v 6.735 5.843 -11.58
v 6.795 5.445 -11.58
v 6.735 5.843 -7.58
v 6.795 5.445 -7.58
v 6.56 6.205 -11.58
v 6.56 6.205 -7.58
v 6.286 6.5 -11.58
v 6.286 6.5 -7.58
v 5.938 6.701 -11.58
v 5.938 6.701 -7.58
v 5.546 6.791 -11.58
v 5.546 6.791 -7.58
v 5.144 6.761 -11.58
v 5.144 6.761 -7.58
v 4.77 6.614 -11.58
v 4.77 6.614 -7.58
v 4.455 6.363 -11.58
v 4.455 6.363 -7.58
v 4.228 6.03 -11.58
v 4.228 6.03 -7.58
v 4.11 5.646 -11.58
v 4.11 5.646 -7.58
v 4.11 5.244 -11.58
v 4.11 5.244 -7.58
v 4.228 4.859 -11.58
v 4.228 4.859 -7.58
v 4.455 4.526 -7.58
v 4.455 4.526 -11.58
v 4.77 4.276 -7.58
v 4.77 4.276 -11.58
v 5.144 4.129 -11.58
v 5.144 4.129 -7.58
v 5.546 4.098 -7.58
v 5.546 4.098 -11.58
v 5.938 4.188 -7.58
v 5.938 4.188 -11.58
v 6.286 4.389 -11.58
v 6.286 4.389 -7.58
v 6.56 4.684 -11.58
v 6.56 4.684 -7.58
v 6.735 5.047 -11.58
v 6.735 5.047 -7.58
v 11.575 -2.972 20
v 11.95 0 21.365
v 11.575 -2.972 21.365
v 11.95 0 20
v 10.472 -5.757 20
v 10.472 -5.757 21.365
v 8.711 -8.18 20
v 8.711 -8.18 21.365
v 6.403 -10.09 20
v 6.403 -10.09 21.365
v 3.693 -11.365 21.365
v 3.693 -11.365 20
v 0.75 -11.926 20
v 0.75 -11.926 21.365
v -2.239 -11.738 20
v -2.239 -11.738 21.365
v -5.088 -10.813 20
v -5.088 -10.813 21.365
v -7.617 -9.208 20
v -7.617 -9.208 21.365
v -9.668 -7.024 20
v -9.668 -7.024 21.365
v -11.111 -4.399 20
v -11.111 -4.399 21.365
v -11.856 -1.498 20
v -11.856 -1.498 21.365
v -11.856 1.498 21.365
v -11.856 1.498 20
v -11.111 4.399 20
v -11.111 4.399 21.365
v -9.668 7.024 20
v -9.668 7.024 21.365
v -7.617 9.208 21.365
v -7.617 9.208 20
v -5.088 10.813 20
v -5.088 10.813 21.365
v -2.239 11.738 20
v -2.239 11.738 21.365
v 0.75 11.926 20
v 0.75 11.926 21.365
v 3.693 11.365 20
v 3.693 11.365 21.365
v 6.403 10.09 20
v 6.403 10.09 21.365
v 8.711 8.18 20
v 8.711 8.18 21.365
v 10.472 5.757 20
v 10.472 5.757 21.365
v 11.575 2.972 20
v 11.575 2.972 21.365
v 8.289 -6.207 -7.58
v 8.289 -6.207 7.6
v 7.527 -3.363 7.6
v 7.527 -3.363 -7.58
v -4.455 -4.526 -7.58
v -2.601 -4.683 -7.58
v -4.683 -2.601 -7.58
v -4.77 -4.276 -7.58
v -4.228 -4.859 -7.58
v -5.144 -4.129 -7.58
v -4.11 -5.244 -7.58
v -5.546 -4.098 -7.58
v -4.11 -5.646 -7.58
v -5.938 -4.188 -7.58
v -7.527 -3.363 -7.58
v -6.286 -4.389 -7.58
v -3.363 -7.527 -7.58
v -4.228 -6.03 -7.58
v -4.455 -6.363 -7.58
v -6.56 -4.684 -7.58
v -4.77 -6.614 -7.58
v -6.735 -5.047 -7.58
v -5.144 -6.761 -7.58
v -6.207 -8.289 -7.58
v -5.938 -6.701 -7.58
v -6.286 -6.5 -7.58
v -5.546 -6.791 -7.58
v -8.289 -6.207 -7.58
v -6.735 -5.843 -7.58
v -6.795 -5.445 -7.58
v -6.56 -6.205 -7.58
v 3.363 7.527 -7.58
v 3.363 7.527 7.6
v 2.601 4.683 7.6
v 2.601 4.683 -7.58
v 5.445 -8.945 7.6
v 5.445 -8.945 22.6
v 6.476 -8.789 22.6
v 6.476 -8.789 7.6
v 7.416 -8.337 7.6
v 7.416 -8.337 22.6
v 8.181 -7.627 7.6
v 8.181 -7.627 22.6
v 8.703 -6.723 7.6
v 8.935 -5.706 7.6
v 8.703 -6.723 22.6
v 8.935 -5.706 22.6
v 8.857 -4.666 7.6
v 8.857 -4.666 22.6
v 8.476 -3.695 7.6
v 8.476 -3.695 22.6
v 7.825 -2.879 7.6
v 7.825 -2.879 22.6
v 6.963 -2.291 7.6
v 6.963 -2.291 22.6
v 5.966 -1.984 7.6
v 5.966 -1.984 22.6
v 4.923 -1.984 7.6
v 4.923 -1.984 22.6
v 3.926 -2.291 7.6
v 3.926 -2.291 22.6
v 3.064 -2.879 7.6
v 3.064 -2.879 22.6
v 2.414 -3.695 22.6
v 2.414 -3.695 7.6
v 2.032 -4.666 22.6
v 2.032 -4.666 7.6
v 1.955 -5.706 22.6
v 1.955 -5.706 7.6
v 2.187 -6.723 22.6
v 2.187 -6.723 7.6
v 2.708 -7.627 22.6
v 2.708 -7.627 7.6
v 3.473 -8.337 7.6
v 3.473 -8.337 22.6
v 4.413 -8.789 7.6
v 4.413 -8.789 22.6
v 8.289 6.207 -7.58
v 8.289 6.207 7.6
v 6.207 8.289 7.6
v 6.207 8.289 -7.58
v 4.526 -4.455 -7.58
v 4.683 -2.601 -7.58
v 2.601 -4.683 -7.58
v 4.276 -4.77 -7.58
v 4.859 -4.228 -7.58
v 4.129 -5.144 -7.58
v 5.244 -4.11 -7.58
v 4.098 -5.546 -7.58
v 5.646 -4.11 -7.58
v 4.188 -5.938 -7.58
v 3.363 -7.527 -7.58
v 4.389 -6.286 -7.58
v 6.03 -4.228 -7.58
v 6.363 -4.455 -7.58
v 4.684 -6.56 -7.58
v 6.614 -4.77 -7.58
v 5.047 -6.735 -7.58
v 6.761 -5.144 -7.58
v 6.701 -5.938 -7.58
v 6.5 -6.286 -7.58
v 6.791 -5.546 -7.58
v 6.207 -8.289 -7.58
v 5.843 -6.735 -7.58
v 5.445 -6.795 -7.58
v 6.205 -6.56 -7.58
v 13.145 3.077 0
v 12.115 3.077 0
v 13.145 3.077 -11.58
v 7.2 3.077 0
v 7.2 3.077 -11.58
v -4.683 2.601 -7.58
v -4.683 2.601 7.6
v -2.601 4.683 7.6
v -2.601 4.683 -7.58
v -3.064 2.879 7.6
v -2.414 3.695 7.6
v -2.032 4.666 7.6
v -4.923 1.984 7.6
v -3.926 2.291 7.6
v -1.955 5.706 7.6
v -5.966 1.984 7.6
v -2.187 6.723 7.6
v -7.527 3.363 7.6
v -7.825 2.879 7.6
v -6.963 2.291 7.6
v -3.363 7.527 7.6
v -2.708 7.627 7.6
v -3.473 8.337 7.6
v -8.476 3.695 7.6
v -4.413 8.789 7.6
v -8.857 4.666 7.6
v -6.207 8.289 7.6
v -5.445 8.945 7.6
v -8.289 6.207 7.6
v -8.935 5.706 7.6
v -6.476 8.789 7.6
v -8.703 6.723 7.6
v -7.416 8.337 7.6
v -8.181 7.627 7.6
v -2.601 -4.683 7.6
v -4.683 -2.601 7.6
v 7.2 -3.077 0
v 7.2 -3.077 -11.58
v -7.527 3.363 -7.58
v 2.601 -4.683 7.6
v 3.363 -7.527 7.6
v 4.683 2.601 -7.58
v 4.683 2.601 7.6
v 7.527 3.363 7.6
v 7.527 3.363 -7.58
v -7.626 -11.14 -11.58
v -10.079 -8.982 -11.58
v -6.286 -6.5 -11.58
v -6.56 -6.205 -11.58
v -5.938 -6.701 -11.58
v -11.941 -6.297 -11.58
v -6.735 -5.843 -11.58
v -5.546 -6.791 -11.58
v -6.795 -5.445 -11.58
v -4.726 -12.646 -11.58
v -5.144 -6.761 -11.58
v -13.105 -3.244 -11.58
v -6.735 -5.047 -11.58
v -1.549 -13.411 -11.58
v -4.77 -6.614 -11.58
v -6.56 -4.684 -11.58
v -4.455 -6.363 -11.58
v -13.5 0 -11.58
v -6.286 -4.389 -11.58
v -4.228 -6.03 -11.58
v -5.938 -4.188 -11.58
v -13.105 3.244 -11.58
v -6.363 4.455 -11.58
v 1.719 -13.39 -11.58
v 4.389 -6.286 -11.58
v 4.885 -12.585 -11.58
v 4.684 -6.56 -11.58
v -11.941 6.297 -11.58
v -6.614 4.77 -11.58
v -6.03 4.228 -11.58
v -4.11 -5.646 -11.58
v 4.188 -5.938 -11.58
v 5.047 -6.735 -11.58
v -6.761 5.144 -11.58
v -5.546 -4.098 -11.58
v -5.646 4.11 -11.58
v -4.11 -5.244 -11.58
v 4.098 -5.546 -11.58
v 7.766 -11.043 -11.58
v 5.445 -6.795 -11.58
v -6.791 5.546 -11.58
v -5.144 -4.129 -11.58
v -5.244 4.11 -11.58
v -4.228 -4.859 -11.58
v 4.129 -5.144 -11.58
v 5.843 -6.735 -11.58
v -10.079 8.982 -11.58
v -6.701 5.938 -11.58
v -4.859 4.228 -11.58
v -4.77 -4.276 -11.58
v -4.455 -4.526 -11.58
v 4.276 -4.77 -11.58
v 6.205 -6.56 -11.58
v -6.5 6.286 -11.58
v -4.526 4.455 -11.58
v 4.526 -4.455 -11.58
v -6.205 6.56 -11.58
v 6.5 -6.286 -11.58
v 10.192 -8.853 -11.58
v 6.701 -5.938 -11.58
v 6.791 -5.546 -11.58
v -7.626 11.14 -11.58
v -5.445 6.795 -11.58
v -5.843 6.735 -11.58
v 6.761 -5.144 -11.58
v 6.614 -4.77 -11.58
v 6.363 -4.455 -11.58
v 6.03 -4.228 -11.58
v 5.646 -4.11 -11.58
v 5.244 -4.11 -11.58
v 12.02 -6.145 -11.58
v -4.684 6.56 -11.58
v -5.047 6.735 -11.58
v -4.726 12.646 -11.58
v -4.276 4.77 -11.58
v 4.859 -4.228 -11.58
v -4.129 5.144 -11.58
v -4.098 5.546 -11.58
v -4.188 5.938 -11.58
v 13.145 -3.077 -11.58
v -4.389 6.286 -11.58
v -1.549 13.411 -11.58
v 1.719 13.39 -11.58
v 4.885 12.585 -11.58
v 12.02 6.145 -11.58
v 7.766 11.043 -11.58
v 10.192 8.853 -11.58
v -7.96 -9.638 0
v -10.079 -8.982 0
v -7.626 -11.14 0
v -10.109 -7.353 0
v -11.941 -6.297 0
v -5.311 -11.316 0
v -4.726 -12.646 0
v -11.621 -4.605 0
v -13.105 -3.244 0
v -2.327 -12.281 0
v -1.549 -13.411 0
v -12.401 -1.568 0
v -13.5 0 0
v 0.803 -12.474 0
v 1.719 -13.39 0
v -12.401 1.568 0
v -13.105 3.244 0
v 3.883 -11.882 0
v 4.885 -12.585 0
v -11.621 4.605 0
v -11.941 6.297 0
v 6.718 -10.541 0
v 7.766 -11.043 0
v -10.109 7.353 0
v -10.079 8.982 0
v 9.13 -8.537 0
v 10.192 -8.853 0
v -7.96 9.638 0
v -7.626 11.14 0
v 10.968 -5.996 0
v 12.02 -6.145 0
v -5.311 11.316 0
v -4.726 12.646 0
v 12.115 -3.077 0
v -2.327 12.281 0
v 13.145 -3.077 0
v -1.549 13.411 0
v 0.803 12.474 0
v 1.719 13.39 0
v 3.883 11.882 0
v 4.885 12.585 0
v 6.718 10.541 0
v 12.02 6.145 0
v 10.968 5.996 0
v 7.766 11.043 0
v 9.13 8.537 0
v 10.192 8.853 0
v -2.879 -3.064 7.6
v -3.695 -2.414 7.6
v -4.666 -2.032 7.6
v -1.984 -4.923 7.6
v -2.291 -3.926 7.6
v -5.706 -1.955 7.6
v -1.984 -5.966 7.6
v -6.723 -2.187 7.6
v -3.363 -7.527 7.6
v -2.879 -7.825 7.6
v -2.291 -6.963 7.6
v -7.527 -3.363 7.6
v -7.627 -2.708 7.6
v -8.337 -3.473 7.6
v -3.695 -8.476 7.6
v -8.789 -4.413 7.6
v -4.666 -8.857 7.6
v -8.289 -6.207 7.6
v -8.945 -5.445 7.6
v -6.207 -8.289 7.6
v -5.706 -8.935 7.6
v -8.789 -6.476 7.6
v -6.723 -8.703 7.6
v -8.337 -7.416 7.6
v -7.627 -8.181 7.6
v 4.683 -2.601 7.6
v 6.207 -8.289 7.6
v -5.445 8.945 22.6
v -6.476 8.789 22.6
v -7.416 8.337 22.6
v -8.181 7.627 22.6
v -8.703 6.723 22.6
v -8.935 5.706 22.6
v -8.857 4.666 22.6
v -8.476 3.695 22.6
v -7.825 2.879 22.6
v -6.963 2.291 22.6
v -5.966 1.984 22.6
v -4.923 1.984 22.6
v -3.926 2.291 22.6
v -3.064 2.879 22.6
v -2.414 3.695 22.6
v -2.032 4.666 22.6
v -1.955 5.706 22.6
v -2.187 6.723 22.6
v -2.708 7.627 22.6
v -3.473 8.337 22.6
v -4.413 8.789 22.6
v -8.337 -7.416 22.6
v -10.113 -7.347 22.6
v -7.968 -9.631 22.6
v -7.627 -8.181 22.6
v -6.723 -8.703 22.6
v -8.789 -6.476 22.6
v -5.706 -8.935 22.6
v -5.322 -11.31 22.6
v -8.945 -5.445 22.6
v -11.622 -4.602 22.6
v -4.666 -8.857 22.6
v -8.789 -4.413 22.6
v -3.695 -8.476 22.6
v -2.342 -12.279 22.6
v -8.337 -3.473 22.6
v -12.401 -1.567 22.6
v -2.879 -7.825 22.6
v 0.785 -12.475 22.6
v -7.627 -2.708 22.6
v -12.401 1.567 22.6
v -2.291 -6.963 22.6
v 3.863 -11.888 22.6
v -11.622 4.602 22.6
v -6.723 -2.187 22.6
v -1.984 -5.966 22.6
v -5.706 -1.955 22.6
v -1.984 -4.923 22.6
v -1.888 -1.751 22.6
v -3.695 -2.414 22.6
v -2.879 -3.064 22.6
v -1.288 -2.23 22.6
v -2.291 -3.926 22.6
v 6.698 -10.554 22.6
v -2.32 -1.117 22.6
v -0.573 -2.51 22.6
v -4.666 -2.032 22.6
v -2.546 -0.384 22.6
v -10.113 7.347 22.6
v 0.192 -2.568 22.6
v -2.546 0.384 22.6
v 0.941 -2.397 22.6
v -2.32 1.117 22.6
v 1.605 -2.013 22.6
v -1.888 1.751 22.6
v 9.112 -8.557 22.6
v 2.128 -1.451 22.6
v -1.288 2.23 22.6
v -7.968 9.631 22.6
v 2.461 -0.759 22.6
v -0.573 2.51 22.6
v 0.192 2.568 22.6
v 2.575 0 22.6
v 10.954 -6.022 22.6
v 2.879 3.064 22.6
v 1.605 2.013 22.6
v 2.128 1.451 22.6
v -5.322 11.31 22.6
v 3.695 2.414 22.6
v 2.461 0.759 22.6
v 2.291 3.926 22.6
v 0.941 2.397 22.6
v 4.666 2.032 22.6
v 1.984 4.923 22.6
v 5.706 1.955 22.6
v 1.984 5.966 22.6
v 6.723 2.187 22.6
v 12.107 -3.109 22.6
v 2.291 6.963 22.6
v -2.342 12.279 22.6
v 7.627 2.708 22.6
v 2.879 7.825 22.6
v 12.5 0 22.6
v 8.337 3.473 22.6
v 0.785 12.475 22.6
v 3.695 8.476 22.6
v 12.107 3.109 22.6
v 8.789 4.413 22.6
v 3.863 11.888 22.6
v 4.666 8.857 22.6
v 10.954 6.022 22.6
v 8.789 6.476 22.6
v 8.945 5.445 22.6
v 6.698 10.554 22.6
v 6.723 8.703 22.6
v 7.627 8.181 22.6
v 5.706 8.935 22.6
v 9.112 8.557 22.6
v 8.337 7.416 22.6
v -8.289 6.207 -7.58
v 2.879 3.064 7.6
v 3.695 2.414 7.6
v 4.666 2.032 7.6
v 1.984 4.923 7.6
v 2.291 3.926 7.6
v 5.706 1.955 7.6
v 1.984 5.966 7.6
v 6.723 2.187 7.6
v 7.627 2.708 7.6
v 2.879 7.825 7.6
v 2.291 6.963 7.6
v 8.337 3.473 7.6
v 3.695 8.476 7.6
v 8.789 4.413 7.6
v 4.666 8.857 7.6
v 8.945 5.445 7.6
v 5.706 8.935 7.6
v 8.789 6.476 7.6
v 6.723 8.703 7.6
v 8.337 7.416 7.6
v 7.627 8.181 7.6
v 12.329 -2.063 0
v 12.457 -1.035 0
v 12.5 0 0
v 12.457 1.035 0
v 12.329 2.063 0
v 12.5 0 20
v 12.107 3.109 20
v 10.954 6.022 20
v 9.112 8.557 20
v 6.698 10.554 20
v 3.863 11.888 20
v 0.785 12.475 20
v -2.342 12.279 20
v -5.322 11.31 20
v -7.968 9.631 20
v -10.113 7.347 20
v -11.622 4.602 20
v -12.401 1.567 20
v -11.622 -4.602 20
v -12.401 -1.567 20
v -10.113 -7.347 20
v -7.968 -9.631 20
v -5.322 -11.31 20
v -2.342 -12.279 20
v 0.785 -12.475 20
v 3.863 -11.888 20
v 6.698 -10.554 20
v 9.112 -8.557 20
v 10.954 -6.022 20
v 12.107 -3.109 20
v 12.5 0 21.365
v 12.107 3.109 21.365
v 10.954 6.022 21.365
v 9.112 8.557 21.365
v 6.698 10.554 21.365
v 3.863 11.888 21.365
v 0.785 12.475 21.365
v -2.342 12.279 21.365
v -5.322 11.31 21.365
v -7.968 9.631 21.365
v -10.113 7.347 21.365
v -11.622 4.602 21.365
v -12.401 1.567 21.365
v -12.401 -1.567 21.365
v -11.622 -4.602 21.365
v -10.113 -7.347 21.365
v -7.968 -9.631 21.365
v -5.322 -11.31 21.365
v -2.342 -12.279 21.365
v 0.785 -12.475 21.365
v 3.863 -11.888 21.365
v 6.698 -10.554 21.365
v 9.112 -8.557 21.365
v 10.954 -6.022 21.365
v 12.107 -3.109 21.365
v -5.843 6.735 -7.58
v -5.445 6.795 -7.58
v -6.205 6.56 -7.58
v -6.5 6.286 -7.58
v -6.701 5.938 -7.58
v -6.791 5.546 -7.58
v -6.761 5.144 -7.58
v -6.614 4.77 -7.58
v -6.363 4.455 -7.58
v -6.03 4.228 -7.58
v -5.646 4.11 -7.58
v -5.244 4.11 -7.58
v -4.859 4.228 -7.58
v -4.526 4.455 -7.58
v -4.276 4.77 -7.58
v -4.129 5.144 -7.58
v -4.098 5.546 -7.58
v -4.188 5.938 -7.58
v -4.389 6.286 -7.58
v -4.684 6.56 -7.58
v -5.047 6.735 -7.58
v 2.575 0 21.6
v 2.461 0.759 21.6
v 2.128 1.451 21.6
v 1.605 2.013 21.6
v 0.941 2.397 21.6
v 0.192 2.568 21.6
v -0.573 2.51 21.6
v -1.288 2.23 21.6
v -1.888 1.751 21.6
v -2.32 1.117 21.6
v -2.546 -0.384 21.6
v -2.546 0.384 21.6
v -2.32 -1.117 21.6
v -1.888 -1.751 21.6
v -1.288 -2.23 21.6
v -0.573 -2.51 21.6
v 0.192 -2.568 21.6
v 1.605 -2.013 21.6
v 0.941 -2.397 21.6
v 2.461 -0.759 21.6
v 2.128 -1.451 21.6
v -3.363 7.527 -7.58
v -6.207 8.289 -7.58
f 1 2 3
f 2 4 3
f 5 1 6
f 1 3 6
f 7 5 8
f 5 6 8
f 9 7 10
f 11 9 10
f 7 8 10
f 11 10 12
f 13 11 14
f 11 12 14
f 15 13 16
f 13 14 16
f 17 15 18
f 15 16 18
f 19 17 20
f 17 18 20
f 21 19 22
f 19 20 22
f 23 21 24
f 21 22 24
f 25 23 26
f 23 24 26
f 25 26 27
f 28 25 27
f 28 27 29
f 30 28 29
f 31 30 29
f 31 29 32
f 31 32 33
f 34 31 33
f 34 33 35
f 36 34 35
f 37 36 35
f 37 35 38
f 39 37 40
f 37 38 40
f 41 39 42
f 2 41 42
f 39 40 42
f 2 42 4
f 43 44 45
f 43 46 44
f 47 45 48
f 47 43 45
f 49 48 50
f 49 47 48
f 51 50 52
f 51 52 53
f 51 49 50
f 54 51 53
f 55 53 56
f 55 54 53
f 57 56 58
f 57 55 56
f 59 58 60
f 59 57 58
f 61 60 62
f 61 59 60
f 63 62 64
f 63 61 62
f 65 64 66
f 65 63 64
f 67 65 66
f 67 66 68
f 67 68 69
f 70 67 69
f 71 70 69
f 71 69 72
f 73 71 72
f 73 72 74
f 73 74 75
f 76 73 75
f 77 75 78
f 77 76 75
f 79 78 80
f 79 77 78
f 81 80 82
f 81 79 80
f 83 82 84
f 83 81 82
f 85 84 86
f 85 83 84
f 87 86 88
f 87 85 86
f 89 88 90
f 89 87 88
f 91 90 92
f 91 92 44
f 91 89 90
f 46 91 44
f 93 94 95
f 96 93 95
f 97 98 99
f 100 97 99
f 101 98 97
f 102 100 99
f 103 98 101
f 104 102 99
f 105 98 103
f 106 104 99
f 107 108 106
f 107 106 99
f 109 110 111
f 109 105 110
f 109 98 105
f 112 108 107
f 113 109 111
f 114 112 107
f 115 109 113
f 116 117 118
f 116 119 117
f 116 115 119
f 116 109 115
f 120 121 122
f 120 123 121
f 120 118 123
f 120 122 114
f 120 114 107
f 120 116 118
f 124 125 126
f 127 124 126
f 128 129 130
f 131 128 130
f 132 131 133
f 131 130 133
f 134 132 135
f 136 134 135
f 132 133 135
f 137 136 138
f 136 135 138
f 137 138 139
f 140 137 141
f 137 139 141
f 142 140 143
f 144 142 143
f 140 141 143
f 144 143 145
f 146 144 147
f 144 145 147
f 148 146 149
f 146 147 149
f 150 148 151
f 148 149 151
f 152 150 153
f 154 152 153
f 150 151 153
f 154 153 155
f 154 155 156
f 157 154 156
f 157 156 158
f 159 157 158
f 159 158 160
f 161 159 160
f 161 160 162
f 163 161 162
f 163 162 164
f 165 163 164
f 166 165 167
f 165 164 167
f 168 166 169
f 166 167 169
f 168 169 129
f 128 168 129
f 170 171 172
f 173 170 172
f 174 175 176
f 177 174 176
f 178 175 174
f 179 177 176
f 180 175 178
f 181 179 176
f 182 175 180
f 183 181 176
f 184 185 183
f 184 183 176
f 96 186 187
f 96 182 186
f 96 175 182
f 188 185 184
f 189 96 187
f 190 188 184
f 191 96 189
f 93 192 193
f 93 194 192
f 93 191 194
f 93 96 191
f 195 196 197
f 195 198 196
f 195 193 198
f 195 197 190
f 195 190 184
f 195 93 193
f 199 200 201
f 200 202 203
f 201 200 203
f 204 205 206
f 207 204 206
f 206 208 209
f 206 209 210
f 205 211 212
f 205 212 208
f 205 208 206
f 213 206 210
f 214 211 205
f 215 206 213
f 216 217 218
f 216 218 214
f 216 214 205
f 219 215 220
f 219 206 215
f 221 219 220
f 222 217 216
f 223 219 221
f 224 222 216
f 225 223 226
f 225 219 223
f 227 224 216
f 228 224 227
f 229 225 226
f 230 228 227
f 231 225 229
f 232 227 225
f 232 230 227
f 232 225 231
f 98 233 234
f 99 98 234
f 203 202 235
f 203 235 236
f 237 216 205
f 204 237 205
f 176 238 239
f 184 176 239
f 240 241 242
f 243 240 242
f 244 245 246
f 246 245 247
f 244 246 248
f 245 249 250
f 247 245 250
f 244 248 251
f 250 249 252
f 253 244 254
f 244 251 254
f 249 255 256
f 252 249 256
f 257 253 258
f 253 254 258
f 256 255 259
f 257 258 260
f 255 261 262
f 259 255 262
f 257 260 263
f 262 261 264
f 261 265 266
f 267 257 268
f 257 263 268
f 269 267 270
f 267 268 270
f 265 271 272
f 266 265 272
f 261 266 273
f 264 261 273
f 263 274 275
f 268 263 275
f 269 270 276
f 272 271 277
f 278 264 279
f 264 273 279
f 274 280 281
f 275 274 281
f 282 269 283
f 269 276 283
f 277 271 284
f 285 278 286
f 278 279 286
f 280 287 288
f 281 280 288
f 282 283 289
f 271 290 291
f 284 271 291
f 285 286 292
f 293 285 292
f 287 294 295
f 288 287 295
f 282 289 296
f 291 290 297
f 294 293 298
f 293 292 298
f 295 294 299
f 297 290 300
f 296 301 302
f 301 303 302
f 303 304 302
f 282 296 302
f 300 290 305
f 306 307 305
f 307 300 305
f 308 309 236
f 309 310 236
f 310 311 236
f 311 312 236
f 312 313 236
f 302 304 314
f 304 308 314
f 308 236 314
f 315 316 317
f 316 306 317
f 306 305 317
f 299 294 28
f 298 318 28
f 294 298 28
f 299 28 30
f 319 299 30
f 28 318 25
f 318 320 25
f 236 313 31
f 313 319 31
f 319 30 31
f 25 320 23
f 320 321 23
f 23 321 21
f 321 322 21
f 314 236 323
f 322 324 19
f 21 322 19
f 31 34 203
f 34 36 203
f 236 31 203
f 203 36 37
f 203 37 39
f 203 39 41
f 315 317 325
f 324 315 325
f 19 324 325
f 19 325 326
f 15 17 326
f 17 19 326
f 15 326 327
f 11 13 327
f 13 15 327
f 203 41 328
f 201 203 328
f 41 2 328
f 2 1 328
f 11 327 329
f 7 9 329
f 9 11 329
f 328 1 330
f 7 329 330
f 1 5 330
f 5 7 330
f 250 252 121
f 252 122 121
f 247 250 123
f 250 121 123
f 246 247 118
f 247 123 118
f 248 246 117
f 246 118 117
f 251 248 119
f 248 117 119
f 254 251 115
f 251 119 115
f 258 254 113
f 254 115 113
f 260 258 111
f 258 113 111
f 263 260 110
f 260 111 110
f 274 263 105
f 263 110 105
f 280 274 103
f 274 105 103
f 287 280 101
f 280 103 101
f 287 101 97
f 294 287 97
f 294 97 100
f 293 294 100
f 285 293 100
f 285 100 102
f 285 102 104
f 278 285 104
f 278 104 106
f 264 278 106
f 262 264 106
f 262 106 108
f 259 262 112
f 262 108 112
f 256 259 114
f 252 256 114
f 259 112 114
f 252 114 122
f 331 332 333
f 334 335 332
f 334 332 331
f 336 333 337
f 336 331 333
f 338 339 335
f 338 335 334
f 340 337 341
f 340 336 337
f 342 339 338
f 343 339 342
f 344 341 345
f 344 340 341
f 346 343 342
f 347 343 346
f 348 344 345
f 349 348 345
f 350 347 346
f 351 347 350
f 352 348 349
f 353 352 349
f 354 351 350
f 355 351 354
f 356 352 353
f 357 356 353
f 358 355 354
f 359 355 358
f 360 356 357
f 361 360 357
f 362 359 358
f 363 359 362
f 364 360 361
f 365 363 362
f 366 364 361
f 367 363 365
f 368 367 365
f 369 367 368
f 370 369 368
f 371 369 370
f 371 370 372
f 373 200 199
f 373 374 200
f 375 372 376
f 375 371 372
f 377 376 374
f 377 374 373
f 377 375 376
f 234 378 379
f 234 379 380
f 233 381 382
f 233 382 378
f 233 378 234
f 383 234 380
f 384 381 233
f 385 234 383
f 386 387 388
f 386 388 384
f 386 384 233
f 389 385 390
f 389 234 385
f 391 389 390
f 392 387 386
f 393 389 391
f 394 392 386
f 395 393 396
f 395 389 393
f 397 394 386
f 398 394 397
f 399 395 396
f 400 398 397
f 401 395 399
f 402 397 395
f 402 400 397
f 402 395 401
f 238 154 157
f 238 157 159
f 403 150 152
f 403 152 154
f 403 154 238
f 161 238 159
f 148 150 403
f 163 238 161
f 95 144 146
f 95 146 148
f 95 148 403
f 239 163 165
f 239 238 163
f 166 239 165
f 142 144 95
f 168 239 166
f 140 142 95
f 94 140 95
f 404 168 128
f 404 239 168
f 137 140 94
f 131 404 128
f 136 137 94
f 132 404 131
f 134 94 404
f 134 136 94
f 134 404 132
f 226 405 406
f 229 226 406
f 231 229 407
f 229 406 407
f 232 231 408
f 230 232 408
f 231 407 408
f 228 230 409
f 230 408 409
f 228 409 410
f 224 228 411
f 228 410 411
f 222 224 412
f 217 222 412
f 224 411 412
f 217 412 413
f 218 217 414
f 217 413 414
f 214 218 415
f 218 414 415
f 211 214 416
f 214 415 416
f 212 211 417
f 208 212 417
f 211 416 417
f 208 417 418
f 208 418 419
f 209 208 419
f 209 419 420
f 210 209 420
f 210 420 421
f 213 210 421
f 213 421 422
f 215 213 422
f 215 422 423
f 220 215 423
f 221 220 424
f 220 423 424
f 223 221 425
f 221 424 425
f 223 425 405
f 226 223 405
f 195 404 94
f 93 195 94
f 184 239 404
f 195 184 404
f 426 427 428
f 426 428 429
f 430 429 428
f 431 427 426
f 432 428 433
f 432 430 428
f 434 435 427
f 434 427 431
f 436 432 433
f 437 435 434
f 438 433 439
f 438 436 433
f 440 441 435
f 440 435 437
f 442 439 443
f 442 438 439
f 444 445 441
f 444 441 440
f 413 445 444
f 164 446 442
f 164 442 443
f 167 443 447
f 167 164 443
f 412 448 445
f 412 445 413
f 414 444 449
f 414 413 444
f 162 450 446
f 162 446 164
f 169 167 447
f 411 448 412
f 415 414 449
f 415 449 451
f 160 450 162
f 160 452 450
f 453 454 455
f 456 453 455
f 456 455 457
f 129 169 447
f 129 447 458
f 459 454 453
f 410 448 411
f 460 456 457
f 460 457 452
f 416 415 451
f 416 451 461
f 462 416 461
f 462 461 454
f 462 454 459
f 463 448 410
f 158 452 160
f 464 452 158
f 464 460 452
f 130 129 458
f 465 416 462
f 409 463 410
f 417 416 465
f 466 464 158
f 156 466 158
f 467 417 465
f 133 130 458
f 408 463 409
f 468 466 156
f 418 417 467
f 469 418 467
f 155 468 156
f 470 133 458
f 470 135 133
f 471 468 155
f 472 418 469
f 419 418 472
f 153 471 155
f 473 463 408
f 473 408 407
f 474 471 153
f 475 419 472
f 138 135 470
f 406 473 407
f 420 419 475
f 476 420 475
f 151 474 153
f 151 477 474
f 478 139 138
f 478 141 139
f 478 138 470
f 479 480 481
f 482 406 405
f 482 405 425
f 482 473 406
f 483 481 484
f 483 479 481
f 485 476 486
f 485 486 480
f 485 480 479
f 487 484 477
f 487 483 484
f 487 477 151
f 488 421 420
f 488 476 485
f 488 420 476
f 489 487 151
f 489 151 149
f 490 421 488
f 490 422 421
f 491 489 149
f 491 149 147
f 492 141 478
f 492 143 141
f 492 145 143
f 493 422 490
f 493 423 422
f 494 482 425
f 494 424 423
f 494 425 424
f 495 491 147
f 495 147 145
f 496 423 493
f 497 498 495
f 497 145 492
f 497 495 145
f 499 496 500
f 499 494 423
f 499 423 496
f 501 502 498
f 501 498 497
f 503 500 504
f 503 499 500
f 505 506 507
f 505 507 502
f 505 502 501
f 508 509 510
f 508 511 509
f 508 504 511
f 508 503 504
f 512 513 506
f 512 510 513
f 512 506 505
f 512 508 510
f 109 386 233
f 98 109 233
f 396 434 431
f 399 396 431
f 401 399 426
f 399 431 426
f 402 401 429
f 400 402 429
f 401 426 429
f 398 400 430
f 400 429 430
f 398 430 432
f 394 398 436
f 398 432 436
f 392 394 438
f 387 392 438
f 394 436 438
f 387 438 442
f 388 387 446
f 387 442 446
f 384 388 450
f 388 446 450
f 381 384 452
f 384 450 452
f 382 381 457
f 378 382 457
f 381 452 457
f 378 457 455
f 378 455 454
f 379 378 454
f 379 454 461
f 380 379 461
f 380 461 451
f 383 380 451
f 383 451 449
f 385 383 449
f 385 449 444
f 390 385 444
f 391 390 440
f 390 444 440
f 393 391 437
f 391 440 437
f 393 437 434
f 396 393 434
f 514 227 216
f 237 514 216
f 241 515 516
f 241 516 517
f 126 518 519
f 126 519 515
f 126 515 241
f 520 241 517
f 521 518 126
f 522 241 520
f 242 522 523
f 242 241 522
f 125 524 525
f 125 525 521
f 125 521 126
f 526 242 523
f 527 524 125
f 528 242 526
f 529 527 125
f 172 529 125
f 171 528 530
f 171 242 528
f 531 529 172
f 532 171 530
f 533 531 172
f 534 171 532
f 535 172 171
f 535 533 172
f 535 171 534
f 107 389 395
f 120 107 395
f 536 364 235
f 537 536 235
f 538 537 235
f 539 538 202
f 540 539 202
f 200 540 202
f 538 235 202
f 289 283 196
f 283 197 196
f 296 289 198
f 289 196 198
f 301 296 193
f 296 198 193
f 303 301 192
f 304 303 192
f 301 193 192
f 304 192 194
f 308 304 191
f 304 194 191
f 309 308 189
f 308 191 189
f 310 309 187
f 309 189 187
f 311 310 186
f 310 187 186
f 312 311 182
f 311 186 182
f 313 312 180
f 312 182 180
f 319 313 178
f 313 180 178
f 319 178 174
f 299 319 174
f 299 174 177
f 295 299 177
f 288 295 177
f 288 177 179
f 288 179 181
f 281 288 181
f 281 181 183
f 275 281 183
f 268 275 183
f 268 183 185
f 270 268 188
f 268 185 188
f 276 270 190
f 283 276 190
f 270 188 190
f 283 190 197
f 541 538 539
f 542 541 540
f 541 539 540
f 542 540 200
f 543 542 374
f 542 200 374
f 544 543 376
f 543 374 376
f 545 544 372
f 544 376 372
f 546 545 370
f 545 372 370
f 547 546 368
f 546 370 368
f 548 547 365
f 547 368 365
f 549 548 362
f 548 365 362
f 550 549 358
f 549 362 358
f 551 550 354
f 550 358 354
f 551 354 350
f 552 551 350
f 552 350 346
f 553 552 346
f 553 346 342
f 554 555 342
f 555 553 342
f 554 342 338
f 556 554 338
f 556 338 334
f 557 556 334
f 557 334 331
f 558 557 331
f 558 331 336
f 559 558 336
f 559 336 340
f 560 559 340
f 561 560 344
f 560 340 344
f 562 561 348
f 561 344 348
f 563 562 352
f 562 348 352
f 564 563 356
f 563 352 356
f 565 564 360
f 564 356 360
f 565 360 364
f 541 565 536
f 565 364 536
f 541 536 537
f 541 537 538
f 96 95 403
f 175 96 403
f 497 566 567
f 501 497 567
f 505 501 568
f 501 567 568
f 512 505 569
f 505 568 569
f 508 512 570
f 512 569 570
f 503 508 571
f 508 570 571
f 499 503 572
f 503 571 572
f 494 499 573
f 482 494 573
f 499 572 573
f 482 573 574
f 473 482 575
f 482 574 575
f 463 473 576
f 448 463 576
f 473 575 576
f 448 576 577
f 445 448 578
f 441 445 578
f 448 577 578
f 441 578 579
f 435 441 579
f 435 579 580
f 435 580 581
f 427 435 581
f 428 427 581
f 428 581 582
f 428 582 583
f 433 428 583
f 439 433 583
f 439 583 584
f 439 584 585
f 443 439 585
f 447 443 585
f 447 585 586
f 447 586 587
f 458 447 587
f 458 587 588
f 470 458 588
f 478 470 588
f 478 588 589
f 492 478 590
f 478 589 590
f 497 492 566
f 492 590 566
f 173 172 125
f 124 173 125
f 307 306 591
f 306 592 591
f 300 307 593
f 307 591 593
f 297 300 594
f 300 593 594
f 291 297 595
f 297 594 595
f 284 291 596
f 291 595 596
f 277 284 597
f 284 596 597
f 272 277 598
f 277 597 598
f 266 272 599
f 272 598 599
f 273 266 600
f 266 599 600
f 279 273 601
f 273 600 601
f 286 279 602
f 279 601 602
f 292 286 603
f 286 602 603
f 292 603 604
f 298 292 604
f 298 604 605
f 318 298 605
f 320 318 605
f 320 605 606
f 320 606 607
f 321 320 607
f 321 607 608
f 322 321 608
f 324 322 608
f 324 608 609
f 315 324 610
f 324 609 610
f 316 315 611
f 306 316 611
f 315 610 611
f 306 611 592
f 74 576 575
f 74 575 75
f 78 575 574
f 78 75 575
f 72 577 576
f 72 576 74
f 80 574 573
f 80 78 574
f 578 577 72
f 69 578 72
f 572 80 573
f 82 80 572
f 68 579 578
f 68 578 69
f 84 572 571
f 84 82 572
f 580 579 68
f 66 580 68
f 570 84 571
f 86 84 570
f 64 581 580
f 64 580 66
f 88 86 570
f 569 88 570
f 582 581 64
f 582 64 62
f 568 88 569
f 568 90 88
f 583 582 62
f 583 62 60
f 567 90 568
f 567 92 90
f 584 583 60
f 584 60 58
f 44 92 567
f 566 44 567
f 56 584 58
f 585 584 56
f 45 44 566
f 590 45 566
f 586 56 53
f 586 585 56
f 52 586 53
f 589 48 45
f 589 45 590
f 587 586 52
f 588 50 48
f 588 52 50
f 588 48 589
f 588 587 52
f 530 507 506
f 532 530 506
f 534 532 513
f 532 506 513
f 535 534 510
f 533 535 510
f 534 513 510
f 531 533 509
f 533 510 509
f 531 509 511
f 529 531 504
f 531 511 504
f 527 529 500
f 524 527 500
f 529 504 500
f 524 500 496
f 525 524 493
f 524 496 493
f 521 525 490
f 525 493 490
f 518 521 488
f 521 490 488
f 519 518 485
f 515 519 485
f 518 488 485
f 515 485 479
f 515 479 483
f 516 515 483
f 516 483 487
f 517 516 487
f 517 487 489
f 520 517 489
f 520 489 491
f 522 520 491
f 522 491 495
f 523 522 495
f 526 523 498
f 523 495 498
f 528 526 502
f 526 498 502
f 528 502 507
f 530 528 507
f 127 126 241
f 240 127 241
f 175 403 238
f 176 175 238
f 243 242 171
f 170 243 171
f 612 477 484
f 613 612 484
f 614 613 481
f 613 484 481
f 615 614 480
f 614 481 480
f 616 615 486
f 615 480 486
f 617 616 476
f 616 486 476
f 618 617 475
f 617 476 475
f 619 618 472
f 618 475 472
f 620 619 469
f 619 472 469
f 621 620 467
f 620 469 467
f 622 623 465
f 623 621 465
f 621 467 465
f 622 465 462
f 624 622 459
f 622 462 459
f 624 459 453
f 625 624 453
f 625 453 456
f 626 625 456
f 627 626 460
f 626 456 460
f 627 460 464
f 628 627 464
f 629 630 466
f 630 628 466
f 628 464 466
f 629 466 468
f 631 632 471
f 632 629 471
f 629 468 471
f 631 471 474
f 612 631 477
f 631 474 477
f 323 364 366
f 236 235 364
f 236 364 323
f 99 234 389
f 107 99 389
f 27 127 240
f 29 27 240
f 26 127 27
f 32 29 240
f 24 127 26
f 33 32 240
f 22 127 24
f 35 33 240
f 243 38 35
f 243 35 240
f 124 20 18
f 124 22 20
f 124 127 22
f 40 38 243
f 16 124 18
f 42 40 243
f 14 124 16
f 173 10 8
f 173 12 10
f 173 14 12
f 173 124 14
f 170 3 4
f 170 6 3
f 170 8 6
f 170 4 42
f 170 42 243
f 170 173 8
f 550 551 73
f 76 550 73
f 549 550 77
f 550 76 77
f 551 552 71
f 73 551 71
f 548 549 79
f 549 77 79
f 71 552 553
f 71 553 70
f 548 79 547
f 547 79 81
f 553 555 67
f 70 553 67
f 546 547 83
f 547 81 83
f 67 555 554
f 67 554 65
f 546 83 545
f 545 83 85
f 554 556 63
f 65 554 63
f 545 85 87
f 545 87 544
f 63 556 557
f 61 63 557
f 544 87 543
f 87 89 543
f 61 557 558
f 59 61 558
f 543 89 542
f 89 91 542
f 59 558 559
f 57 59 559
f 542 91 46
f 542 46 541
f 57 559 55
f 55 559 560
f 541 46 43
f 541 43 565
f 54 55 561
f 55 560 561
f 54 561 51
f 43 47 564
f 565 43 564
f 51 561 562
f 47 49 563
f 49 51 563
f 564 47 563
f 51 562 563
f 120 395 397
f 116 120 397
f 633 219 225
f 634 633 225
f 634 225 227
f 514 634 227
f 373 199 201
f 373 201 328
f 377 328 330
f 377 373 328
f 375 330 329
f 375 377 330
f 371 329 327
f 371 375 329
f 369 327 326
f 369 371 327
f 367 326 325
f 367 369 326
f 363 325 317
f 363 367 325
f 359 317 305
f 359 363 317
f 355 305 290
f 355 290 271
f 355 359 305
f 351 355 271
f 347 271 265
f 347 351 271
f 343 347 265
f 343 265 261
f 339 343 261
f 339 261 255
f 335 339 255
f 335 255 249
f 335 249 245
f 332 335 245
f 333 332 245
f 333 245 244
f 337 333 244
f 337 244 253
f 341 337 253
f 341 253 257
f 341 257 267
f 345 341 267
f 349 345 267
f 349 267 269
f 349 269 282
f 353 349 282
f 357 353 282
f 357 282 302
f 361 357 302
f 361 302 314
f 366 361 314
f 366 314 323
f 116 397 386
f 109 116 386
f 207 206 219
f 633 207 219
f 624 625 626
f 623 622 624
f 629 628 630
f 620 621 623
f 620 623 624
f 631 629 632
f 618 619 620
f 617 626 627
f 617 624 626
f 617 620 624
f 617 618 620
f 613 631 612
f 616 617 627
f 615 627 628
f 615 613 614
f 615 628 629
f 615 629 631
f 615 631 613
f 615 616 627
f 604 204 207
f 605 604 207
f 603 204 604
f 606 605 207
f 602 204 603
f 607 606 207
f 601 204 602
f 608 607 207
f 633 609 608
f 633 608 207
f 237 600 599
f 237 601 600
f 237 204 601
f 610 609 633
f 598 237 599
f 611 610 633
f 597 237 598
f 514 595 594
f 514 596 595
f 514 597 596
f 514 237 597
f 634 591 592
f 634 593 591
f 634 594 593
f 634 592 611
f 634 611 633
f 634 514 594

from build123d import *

# Parameters (mm, degrees)
SKETCH1_R           = 12.5
BOSS_EXTRUDE1_DEPTH = 22.6
SKETCH2_R           = 13.5
BOSS_EXTRUDE2_DEPTH = 11.58
SKETCH9_W           = 1.365
SKETCH9_H           = 0.55
SKETCH4_R           = 2.575
MAGNETSLOT_DEPTH    = 1
NUTCUT_DEPTH        = 30.18
SKETCH7_R           = 3.5
NUTHOLE_DEPTH       = 15
SKETCH8_R           = 1.35
SCREWHOLE_DEPTH     = 40.150637287
CIRPATTERN1_COUNT   = 4
SKETCH11_W          = 15.473481632
SKETCH11_H          = 6.154945972
CUT_EXTRUDE1_DEPTH  = 34.488804099


with BuildPart() as part:
    # Sketch1 → Boss-Extrude1 (new body)
    with BuildSketch(Plane.XY):
        Circle(SKETCH1_R)
    extrude(amount=BOSS_EXTRUDE1_DEPTH)

    # Sketch2 → Boss-Extrude2 (add)
    with BuildSketch(Plane.XY):
        Circle(SKETCH2_R)
    extrude(amount=-BOSS_EXTRUDE2_DEPTH)

    # Sketch9 → Cut-Revolve1 (revolve, cut)
    with BuildSketch(Plane(origin=(0, 0, 0), x_dir=(0, 0, -1), z_dir=(1, 0, 0)), mode=Mode.PRIVATE) as cut_revolve1_sk:
        with Locations((-20.6825, -12.225)):
            Rectangle(SKETCH9_W, SKETCH9_H)
    revolve(cut_revolve1_sk.sketch.rotate(Axis((0, 0, 24.309), (0, 0, -1)), 270), axis=Axis((0, 0, 24.309), (0, 0, -1)), mode=Mode.SUBTRACT)

    # Sketch4 → MagnetSlot (cut)
    with BuildSketch(Plane.XY.offset(22.6)):
        Circle(SKETCH4_R)
    magnetslot = extrude(amount=-MAGNETSLOT_DEPTH, mode=Mode.SUBTRACT)

    # Sketch6 → NutCut (cut)
    with BuildSketch(Plane.XY.offset(22.6)):
        Polygon((6.206811366, 8.288877648), (3.362655934, 7.526788497), (2.600566782, 4.682633064), (4.682633064, 2.600566782), (7.526788497, 3.362655934), (8.288877648, 6.206811366), align=None)
    nutcut = extrude(amount=-NUTCUT_DEPTH, mode=Mode.SUBTRACT)

    # Sketch7 → NutHole (cut)
    with BuildSketch(Plane.XY.offset(22.6)):
        with Locations((5.444722215, 5.444722215)):
            Circle(SKETCH7_R)
    nuthole = extrude(amount=-NUTHOLE_DEPTH, mode=Mode.SUBTRACT)

    # Sketch8 → ScrewHole (cut, symmetric)
    with BuildSketch(Plane.XY.offset(22.6)):
        with Locations((5.444722215, 5.444722215)):
            Circle(SKETCH8_R)
    screwhole = extrude(amount=SCREWHOLE_DEPTH, both=True, mode=Mode.SUBTRACT)

    # CirPattern1: MagnetSlot, NutCut, NutHole, ScrewHole ×4 about axis
    cirpattern1_axis = Axis((0, 0, 0), (0, 0, 1))
    add([magnetslot.rotate(cirpattern1_axis, i * 360 / CIRPATTERN1_COUNT) for i in range(1, CIRPATTERN1_COUNT)], mode=Mode.SUBTRACT)
    add([nutcut.rotate(cirpattern1_axis, i * 360 / CIRPATTERN1_COUNT) for i in range(1, CIRPATTERN1_COUNT)], mode=Mode.SUBTRACT)
    add([nuthole.rotate(cirpattern1_axis, i * 360 / CIRPATTERN1_COUNT) for i in range(1, CIRPATTERN1_COUNT)], mode=Mode.SUBTRACT)
    add([screwhole.rotate(cirpattern1_axis, i * 360 / CIRPATTERN1_COUNT) for i in range(1, CIRPATTERN1_COUNT)], mode=Mode.SUBTRACT)

    # Sketch11 → Cut-Extrude1 (cut, through all)
    with BuildSketch(Plane(origin=(7.2, 0, 0), x_dir=(0, 0, -1), z_dir=(1, 0, 0))):
        with Locations((7.736740816, 0)):
            Rectangle(SKETCH11_W, SKETCH11_H)
    extrude(amount=CUT_EXTRUDE1_DEPTH, mode=Mode.SUBTRACT)


solid = part.part
